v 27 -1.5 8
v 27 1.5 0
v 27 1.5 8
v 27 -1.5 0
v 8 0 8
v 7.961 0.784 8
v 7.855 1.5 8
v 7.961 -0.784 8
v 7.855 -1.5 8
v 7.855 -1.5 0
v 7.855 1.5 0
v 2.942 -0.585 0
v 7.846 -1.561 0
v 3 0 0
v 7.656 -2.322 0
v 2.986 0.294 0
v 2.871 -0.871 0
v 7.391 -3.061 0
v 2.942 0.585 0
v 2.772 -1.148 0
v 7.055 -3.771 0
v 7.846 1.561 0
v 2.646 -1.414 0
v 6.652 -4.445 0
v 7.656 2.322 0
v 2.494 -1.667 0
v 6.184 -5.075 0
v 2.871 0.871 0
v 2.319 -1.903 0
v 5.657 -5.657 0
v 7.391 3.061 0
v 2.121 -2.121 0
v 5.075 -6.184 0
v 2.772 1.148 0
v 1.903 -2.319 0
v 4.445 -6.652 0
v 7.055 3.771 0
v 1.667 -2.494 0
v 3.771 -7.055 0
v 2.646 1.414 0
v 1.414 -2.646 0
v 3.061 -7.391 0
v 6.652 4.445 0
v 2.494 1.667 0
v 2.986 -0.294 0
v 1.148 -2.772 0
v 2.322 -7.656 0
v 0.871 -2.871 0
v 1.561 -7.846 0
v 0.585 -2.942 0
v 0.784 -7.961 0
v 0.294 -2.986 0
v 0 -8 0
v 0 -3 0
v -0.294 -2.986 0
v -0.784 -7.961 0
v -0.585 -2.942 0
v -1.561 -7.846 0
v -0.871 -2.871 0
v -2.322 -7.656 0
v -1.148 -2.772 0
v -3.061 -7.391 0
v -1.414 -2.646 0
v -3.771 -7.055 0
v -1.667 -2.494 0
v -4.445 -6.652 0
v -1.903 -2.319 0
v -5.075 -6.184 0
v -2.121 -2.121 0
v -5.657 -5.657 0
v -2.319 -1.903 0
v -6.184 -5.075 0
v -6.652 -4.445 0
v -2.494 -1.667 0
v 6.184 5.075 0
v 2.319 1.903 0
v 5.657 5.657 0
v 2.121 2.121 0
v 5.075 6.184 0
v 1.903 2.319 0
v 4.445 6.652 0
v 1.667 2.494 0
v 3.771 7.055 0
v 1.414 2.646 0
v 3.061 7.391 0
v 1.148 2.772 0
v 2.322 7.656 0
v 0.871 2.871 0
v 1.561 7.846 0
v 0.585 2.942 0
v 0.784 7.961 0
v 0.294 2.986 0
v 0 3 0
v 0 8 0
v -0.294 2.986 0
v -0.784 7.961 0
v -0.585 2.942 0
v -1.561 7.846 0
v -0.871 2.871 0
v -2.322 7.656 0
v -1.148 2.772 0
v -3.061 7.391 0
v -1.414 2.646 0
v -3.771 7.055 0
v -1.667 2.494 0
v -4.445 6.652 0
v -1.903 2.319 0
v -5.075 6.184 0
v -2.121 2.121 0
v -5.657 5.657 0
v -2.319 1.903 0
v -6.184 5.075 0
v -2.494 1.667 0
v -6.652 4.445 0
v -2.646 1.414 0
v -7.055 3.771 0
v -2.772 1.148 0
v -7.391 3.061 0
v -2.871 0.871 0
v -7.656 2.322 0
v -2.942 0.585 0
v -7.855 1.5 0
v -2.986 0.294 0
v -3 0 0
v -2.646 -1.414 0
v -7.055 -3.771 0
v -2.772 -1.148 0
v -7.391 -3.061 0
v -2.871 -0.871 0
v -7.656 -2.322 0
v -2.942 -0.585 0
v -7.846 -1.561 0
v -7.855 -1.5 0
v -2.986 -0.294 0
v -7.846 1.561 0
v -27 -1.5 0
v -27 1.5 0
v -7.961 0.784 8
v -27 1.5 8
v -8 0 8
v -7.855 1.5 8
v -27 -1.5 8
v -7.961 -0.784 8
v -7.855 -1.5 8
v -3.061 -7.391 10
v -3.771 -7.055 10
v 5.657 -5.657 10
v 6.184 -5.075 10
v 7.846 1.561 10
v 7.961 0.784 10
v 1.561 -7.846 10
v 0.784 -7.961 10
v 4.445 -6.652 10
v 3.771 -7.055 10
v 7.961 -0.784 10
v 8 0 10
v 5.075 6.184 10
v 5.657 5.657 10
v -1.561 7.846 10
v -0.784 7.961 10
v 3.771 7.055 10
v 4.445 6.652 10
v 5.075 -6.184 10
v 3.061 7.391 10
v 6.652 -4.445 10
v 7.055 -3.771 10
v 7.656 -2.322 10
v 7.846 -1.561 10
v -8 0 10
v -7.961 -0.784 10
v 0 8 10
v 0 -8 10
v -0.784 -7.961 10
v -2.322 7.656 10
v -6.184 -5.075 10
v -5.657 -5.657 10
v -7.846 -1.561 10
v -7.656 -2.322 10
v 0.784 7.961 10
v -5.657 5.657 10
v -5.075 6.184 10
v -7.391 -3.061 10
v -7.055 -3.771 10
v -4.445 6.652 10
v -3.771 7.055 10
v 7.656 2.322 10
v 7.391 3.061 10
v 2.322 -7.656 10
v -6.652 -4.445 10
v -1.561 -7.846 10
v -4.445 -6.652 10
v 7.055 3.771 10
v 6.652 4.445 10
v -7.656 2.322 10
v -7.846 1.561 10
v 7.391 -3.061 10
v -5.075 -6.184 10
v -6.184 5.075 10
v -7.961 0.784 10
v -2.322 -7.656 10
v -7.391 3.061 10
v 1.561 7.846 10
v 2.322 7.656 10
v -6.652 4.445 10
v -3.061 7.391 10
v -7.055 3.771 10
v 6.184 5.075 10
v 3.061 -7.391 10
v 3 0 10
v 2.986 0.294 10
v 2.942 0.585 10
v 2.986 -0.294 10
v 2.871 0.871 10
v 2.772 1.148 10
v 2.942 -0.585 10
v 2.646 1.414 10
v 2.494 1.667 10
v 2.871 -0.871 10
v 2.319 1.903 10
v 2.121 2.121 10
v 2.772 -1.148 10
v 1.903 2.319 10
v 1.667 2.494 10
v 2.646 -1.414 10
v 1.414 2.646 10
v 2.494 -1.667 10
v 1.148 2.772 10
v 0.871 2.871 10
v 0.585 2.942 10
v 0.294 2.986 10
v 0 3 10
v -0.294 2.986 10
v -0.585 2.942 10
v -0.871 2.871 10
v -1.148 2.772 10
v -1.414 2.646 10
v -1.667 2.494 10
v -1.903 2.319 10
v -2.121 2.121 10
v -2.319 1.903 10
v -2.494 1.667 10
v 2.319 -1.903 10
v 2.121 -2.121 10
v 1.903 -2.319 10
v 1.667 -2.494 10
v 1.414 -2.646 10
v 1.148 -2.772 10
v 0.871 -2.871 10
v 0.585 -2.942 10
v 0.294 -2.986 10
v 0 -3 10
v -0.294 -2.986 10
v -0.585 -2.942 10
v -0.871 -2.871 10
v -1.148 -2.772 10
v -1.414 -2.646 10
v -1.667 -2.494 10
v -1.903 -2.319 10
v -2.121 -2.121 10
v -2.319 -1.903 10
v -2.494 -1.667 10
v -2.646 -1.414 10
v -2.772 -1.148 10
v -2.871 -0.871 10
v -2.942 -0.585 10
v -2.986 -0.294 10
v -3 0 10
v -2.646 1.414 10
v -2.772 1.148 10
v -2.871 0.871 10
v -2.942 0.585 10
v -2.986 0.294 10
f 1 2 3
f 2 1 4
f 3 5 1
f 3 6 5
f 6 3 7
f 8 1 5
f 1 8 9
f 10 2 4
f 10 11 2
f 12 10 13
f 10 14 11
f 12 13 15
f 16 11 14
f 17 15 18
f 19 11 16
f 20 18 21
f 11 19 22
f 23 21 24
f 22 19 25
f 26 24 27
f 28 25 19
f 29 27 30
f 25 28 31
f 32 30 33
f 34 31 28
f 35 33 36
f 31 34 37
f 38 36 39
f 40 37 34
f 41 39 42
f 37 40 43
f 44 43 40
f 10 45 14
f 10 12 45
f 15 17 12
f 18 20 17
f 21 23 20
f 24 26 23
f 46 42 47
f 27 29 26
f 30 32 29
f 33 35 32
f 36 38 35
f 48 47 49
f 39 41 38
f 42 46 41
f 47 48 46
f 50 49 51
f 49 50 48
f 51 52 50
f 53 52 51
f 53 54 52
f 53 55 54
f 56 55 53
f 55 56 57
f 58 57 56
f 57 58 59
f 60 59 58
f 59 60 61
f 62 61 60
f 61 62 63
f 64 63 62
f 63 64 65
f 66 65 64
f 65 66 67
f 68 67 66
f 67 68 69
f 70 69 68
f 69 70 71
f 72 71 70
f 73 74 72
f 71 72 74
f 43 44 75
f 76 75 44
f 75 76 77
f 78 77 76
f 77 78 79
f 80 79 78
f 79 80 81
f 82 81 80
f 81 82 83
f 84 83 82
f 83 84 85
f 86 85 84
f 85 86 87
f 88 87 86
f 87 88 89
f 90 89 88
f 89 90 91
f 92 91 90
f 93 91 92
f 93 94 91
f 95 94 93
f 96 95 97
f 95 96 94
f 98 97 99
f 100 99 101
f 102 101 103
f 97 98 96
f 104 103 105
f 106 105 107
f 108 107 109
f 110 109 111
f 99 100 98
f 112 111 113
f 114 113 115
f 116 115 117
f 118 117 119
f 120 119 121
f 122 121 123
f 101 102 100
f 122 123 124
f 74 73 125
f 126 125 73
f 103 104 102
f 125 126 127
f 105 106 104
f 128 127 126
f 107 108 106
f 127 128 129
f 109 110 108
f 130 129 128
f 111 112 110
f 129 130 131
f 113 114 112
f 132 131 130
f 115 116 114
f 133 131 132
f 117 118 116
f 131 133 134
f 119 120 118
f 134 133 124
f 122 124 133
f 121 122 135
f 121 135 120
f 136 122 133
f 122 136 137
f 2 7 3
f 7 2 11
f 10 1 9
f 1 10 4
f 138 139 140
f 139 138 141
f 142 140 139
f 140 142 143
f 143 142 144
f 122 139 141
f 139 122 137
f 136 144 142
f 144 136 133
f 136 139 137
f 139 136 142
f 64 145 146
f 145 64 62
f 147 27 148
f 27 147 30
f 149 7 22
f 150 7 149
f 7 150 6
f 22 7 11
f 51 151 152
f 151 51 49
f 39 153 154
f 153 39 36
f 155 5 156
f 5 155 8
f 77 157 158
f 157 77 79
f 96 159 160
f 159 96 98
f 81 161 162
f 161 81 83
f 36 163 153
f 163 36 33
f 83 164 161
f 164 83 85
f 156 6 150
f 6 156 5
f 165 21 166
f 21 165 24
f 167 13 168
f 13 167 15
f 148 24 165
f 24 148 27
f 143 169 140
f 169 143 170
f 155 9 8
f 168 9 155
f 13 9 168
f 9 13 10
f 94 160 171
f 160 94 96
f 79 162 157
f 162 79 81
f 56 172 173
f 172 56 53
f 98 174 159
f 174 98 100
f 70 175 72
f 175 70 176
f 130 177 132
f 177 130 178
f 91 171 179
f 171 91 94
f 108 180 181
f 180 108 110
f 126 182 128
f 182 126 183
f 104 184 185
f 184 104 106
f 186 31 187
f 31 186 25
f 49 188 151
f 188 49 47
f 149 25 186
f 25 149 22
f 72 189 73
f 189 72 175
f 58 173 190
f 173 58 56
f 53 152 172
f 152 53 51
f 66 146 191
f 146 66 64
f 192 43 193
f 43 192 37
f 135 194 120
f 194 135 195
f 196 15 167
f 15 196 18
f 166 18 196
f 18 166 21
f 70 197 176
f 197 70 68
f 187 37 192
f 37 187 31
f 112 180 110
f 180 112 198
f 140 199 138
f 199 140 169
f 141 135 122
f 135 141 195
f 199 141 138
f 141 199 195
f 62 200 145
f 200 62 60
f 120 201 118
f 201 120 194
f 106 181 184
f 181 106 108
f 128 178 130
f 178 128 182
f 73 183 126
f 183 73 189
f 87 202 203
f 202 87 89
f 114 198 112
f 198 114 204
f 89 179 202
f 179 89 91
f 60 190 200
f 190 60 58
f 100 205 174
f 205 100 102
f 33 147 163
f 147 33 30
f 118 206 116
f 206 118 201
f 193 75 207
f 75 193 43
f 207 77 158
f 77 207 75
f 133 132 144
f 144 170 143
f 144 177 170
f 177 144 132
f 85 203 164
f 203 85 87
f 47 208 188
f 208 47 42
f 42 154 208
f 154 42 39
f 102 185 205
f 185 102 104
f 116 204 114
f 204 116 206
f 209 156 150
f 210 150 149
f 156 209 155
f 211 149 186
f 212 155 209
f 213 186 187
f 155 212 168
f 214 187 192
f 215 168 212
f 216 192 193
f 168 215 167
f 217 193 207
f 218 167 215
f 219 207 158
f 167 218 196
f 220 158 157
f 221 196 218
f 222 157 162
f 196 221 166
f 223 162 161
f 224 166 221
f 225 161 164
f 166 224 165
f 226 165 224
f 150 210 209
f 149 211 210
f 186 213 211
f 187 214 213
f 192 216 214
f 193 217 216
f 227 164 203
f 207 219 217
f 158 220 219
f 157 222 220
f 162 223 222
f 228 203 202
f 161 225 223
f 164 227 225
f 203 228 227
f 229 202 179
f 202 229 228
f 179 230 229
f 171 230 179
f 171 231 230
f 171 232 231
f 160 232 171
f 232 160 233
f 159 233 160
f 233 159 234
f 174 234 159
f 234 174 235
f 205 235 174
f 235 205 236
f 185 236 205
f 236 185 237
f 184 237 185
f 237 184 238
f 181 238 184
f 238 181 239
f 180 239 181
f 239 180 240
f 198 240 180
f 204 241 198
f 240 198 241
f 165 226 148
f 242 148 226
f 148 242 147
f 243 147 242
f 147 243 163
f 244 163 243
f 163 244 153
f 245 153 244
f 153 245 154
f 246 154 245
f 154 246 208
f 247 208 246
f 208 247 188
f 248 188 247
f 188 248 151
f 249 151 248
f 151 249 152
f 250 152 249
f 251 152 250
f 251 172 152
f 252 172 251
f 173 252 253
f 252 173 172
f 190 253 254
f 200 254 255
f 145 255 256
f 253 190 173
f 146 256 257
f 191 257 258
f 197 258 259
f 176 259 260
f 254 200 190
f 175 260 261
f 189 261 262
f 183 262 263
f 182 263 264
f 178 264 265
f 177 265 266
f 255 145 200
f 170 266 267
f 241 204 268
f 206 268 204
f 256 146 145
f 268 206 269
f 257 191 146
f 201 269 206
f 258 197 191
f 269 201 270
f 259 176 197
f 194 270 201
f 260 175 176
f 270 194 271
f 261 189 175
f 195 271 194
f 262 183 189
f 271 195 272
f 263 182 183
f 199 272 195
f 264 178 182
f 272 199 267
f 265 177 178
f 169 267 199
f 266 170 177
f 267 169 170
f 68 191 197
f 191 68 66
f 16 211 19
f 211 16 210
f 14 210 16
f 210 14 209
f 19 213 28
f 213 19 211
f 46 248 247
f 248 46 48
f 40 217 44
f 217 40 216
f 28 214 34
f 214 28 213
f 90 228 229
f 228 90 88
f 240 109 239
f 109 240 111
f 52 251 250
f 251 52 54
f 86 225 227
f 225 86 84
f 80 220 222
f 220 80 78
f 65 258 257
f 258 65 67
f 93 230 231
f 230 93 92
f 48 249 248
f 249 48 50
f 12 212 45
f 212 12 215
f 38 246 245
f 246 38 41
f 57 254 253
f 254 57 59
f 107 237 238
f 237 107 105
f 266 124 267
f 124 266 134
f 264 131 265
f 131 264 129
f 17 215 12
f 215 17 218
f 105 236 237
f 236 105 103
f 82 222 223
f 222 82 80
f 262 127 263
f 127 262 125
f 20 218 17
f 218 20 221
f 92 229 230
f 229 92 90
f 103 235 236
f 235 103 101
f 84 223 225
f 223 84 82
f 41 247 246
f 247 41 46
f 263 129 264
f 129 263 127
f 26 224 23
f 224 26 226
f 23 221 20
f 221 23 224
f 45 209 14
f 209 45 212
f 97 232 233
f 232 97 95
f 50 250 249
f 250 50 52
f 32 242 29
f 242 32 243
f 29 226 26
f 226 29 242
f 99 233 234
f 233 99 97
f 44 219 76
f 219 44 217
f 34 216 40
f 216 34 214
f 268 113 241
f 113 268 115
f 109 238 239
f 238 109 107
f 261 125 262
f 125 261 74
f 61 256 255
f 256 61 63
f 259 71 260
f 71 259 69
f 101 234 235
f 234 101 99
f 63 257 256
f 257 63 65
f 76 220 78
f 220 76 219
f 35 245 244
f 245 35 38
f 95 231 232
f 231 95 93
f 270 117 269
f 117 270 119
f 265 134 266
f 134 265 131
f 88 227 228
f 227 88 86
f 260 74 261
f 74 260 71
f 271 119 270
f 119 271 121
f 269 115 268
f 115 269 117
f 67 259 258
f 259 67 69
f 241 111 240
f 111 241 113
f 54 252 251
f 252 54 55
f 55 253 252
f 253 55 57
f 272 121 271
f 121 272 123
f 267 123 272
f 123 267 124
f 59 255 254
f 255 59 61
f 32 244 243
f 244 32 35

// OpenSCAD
// Wing nut - a finger-tightened nut blank: a central hub with a bore and two flat wings.
// (A bore, not a modelled thread - tap it or use it as a thumb spacer.) NOVEL general part.
//
// @desc wing nut - a finger-tightened nut blank with two wings and a bore
// @prompt Design a wing nut in OpenSCAD: a central hub {hub_d} mm across and {height} mm tall with a {bore} mm bore, and two flat wings extending {wing} mm so it can be turned by hand. Reply with a single complete OpenSCAD file.
// @param hub_d  hub diameter, mm    [10:30]
// @param height height, mm          [6:20]
// @param bore   bore diameter, mm    [3:16]
// @param wing   wing length, mm      [10:35]

hub_d  = 16;
height = 10;
bore   = 6;
wing   = 20;

$fn = 64;

wing_t = 3;
wing_h = height * 0.8;

difference() {
    union() {
        cylinder(h = height, d = hub_d);
        for (a = [0, 180])
            rotate([0, 0, a]) translate([hub_d / 2 - 1, -wing_t / 2, 0]) cube([wing, wing_t, wing_h]);
    }
    translate([0, 0, -1]) cylinder(h = height + 2, d = bore);
}
